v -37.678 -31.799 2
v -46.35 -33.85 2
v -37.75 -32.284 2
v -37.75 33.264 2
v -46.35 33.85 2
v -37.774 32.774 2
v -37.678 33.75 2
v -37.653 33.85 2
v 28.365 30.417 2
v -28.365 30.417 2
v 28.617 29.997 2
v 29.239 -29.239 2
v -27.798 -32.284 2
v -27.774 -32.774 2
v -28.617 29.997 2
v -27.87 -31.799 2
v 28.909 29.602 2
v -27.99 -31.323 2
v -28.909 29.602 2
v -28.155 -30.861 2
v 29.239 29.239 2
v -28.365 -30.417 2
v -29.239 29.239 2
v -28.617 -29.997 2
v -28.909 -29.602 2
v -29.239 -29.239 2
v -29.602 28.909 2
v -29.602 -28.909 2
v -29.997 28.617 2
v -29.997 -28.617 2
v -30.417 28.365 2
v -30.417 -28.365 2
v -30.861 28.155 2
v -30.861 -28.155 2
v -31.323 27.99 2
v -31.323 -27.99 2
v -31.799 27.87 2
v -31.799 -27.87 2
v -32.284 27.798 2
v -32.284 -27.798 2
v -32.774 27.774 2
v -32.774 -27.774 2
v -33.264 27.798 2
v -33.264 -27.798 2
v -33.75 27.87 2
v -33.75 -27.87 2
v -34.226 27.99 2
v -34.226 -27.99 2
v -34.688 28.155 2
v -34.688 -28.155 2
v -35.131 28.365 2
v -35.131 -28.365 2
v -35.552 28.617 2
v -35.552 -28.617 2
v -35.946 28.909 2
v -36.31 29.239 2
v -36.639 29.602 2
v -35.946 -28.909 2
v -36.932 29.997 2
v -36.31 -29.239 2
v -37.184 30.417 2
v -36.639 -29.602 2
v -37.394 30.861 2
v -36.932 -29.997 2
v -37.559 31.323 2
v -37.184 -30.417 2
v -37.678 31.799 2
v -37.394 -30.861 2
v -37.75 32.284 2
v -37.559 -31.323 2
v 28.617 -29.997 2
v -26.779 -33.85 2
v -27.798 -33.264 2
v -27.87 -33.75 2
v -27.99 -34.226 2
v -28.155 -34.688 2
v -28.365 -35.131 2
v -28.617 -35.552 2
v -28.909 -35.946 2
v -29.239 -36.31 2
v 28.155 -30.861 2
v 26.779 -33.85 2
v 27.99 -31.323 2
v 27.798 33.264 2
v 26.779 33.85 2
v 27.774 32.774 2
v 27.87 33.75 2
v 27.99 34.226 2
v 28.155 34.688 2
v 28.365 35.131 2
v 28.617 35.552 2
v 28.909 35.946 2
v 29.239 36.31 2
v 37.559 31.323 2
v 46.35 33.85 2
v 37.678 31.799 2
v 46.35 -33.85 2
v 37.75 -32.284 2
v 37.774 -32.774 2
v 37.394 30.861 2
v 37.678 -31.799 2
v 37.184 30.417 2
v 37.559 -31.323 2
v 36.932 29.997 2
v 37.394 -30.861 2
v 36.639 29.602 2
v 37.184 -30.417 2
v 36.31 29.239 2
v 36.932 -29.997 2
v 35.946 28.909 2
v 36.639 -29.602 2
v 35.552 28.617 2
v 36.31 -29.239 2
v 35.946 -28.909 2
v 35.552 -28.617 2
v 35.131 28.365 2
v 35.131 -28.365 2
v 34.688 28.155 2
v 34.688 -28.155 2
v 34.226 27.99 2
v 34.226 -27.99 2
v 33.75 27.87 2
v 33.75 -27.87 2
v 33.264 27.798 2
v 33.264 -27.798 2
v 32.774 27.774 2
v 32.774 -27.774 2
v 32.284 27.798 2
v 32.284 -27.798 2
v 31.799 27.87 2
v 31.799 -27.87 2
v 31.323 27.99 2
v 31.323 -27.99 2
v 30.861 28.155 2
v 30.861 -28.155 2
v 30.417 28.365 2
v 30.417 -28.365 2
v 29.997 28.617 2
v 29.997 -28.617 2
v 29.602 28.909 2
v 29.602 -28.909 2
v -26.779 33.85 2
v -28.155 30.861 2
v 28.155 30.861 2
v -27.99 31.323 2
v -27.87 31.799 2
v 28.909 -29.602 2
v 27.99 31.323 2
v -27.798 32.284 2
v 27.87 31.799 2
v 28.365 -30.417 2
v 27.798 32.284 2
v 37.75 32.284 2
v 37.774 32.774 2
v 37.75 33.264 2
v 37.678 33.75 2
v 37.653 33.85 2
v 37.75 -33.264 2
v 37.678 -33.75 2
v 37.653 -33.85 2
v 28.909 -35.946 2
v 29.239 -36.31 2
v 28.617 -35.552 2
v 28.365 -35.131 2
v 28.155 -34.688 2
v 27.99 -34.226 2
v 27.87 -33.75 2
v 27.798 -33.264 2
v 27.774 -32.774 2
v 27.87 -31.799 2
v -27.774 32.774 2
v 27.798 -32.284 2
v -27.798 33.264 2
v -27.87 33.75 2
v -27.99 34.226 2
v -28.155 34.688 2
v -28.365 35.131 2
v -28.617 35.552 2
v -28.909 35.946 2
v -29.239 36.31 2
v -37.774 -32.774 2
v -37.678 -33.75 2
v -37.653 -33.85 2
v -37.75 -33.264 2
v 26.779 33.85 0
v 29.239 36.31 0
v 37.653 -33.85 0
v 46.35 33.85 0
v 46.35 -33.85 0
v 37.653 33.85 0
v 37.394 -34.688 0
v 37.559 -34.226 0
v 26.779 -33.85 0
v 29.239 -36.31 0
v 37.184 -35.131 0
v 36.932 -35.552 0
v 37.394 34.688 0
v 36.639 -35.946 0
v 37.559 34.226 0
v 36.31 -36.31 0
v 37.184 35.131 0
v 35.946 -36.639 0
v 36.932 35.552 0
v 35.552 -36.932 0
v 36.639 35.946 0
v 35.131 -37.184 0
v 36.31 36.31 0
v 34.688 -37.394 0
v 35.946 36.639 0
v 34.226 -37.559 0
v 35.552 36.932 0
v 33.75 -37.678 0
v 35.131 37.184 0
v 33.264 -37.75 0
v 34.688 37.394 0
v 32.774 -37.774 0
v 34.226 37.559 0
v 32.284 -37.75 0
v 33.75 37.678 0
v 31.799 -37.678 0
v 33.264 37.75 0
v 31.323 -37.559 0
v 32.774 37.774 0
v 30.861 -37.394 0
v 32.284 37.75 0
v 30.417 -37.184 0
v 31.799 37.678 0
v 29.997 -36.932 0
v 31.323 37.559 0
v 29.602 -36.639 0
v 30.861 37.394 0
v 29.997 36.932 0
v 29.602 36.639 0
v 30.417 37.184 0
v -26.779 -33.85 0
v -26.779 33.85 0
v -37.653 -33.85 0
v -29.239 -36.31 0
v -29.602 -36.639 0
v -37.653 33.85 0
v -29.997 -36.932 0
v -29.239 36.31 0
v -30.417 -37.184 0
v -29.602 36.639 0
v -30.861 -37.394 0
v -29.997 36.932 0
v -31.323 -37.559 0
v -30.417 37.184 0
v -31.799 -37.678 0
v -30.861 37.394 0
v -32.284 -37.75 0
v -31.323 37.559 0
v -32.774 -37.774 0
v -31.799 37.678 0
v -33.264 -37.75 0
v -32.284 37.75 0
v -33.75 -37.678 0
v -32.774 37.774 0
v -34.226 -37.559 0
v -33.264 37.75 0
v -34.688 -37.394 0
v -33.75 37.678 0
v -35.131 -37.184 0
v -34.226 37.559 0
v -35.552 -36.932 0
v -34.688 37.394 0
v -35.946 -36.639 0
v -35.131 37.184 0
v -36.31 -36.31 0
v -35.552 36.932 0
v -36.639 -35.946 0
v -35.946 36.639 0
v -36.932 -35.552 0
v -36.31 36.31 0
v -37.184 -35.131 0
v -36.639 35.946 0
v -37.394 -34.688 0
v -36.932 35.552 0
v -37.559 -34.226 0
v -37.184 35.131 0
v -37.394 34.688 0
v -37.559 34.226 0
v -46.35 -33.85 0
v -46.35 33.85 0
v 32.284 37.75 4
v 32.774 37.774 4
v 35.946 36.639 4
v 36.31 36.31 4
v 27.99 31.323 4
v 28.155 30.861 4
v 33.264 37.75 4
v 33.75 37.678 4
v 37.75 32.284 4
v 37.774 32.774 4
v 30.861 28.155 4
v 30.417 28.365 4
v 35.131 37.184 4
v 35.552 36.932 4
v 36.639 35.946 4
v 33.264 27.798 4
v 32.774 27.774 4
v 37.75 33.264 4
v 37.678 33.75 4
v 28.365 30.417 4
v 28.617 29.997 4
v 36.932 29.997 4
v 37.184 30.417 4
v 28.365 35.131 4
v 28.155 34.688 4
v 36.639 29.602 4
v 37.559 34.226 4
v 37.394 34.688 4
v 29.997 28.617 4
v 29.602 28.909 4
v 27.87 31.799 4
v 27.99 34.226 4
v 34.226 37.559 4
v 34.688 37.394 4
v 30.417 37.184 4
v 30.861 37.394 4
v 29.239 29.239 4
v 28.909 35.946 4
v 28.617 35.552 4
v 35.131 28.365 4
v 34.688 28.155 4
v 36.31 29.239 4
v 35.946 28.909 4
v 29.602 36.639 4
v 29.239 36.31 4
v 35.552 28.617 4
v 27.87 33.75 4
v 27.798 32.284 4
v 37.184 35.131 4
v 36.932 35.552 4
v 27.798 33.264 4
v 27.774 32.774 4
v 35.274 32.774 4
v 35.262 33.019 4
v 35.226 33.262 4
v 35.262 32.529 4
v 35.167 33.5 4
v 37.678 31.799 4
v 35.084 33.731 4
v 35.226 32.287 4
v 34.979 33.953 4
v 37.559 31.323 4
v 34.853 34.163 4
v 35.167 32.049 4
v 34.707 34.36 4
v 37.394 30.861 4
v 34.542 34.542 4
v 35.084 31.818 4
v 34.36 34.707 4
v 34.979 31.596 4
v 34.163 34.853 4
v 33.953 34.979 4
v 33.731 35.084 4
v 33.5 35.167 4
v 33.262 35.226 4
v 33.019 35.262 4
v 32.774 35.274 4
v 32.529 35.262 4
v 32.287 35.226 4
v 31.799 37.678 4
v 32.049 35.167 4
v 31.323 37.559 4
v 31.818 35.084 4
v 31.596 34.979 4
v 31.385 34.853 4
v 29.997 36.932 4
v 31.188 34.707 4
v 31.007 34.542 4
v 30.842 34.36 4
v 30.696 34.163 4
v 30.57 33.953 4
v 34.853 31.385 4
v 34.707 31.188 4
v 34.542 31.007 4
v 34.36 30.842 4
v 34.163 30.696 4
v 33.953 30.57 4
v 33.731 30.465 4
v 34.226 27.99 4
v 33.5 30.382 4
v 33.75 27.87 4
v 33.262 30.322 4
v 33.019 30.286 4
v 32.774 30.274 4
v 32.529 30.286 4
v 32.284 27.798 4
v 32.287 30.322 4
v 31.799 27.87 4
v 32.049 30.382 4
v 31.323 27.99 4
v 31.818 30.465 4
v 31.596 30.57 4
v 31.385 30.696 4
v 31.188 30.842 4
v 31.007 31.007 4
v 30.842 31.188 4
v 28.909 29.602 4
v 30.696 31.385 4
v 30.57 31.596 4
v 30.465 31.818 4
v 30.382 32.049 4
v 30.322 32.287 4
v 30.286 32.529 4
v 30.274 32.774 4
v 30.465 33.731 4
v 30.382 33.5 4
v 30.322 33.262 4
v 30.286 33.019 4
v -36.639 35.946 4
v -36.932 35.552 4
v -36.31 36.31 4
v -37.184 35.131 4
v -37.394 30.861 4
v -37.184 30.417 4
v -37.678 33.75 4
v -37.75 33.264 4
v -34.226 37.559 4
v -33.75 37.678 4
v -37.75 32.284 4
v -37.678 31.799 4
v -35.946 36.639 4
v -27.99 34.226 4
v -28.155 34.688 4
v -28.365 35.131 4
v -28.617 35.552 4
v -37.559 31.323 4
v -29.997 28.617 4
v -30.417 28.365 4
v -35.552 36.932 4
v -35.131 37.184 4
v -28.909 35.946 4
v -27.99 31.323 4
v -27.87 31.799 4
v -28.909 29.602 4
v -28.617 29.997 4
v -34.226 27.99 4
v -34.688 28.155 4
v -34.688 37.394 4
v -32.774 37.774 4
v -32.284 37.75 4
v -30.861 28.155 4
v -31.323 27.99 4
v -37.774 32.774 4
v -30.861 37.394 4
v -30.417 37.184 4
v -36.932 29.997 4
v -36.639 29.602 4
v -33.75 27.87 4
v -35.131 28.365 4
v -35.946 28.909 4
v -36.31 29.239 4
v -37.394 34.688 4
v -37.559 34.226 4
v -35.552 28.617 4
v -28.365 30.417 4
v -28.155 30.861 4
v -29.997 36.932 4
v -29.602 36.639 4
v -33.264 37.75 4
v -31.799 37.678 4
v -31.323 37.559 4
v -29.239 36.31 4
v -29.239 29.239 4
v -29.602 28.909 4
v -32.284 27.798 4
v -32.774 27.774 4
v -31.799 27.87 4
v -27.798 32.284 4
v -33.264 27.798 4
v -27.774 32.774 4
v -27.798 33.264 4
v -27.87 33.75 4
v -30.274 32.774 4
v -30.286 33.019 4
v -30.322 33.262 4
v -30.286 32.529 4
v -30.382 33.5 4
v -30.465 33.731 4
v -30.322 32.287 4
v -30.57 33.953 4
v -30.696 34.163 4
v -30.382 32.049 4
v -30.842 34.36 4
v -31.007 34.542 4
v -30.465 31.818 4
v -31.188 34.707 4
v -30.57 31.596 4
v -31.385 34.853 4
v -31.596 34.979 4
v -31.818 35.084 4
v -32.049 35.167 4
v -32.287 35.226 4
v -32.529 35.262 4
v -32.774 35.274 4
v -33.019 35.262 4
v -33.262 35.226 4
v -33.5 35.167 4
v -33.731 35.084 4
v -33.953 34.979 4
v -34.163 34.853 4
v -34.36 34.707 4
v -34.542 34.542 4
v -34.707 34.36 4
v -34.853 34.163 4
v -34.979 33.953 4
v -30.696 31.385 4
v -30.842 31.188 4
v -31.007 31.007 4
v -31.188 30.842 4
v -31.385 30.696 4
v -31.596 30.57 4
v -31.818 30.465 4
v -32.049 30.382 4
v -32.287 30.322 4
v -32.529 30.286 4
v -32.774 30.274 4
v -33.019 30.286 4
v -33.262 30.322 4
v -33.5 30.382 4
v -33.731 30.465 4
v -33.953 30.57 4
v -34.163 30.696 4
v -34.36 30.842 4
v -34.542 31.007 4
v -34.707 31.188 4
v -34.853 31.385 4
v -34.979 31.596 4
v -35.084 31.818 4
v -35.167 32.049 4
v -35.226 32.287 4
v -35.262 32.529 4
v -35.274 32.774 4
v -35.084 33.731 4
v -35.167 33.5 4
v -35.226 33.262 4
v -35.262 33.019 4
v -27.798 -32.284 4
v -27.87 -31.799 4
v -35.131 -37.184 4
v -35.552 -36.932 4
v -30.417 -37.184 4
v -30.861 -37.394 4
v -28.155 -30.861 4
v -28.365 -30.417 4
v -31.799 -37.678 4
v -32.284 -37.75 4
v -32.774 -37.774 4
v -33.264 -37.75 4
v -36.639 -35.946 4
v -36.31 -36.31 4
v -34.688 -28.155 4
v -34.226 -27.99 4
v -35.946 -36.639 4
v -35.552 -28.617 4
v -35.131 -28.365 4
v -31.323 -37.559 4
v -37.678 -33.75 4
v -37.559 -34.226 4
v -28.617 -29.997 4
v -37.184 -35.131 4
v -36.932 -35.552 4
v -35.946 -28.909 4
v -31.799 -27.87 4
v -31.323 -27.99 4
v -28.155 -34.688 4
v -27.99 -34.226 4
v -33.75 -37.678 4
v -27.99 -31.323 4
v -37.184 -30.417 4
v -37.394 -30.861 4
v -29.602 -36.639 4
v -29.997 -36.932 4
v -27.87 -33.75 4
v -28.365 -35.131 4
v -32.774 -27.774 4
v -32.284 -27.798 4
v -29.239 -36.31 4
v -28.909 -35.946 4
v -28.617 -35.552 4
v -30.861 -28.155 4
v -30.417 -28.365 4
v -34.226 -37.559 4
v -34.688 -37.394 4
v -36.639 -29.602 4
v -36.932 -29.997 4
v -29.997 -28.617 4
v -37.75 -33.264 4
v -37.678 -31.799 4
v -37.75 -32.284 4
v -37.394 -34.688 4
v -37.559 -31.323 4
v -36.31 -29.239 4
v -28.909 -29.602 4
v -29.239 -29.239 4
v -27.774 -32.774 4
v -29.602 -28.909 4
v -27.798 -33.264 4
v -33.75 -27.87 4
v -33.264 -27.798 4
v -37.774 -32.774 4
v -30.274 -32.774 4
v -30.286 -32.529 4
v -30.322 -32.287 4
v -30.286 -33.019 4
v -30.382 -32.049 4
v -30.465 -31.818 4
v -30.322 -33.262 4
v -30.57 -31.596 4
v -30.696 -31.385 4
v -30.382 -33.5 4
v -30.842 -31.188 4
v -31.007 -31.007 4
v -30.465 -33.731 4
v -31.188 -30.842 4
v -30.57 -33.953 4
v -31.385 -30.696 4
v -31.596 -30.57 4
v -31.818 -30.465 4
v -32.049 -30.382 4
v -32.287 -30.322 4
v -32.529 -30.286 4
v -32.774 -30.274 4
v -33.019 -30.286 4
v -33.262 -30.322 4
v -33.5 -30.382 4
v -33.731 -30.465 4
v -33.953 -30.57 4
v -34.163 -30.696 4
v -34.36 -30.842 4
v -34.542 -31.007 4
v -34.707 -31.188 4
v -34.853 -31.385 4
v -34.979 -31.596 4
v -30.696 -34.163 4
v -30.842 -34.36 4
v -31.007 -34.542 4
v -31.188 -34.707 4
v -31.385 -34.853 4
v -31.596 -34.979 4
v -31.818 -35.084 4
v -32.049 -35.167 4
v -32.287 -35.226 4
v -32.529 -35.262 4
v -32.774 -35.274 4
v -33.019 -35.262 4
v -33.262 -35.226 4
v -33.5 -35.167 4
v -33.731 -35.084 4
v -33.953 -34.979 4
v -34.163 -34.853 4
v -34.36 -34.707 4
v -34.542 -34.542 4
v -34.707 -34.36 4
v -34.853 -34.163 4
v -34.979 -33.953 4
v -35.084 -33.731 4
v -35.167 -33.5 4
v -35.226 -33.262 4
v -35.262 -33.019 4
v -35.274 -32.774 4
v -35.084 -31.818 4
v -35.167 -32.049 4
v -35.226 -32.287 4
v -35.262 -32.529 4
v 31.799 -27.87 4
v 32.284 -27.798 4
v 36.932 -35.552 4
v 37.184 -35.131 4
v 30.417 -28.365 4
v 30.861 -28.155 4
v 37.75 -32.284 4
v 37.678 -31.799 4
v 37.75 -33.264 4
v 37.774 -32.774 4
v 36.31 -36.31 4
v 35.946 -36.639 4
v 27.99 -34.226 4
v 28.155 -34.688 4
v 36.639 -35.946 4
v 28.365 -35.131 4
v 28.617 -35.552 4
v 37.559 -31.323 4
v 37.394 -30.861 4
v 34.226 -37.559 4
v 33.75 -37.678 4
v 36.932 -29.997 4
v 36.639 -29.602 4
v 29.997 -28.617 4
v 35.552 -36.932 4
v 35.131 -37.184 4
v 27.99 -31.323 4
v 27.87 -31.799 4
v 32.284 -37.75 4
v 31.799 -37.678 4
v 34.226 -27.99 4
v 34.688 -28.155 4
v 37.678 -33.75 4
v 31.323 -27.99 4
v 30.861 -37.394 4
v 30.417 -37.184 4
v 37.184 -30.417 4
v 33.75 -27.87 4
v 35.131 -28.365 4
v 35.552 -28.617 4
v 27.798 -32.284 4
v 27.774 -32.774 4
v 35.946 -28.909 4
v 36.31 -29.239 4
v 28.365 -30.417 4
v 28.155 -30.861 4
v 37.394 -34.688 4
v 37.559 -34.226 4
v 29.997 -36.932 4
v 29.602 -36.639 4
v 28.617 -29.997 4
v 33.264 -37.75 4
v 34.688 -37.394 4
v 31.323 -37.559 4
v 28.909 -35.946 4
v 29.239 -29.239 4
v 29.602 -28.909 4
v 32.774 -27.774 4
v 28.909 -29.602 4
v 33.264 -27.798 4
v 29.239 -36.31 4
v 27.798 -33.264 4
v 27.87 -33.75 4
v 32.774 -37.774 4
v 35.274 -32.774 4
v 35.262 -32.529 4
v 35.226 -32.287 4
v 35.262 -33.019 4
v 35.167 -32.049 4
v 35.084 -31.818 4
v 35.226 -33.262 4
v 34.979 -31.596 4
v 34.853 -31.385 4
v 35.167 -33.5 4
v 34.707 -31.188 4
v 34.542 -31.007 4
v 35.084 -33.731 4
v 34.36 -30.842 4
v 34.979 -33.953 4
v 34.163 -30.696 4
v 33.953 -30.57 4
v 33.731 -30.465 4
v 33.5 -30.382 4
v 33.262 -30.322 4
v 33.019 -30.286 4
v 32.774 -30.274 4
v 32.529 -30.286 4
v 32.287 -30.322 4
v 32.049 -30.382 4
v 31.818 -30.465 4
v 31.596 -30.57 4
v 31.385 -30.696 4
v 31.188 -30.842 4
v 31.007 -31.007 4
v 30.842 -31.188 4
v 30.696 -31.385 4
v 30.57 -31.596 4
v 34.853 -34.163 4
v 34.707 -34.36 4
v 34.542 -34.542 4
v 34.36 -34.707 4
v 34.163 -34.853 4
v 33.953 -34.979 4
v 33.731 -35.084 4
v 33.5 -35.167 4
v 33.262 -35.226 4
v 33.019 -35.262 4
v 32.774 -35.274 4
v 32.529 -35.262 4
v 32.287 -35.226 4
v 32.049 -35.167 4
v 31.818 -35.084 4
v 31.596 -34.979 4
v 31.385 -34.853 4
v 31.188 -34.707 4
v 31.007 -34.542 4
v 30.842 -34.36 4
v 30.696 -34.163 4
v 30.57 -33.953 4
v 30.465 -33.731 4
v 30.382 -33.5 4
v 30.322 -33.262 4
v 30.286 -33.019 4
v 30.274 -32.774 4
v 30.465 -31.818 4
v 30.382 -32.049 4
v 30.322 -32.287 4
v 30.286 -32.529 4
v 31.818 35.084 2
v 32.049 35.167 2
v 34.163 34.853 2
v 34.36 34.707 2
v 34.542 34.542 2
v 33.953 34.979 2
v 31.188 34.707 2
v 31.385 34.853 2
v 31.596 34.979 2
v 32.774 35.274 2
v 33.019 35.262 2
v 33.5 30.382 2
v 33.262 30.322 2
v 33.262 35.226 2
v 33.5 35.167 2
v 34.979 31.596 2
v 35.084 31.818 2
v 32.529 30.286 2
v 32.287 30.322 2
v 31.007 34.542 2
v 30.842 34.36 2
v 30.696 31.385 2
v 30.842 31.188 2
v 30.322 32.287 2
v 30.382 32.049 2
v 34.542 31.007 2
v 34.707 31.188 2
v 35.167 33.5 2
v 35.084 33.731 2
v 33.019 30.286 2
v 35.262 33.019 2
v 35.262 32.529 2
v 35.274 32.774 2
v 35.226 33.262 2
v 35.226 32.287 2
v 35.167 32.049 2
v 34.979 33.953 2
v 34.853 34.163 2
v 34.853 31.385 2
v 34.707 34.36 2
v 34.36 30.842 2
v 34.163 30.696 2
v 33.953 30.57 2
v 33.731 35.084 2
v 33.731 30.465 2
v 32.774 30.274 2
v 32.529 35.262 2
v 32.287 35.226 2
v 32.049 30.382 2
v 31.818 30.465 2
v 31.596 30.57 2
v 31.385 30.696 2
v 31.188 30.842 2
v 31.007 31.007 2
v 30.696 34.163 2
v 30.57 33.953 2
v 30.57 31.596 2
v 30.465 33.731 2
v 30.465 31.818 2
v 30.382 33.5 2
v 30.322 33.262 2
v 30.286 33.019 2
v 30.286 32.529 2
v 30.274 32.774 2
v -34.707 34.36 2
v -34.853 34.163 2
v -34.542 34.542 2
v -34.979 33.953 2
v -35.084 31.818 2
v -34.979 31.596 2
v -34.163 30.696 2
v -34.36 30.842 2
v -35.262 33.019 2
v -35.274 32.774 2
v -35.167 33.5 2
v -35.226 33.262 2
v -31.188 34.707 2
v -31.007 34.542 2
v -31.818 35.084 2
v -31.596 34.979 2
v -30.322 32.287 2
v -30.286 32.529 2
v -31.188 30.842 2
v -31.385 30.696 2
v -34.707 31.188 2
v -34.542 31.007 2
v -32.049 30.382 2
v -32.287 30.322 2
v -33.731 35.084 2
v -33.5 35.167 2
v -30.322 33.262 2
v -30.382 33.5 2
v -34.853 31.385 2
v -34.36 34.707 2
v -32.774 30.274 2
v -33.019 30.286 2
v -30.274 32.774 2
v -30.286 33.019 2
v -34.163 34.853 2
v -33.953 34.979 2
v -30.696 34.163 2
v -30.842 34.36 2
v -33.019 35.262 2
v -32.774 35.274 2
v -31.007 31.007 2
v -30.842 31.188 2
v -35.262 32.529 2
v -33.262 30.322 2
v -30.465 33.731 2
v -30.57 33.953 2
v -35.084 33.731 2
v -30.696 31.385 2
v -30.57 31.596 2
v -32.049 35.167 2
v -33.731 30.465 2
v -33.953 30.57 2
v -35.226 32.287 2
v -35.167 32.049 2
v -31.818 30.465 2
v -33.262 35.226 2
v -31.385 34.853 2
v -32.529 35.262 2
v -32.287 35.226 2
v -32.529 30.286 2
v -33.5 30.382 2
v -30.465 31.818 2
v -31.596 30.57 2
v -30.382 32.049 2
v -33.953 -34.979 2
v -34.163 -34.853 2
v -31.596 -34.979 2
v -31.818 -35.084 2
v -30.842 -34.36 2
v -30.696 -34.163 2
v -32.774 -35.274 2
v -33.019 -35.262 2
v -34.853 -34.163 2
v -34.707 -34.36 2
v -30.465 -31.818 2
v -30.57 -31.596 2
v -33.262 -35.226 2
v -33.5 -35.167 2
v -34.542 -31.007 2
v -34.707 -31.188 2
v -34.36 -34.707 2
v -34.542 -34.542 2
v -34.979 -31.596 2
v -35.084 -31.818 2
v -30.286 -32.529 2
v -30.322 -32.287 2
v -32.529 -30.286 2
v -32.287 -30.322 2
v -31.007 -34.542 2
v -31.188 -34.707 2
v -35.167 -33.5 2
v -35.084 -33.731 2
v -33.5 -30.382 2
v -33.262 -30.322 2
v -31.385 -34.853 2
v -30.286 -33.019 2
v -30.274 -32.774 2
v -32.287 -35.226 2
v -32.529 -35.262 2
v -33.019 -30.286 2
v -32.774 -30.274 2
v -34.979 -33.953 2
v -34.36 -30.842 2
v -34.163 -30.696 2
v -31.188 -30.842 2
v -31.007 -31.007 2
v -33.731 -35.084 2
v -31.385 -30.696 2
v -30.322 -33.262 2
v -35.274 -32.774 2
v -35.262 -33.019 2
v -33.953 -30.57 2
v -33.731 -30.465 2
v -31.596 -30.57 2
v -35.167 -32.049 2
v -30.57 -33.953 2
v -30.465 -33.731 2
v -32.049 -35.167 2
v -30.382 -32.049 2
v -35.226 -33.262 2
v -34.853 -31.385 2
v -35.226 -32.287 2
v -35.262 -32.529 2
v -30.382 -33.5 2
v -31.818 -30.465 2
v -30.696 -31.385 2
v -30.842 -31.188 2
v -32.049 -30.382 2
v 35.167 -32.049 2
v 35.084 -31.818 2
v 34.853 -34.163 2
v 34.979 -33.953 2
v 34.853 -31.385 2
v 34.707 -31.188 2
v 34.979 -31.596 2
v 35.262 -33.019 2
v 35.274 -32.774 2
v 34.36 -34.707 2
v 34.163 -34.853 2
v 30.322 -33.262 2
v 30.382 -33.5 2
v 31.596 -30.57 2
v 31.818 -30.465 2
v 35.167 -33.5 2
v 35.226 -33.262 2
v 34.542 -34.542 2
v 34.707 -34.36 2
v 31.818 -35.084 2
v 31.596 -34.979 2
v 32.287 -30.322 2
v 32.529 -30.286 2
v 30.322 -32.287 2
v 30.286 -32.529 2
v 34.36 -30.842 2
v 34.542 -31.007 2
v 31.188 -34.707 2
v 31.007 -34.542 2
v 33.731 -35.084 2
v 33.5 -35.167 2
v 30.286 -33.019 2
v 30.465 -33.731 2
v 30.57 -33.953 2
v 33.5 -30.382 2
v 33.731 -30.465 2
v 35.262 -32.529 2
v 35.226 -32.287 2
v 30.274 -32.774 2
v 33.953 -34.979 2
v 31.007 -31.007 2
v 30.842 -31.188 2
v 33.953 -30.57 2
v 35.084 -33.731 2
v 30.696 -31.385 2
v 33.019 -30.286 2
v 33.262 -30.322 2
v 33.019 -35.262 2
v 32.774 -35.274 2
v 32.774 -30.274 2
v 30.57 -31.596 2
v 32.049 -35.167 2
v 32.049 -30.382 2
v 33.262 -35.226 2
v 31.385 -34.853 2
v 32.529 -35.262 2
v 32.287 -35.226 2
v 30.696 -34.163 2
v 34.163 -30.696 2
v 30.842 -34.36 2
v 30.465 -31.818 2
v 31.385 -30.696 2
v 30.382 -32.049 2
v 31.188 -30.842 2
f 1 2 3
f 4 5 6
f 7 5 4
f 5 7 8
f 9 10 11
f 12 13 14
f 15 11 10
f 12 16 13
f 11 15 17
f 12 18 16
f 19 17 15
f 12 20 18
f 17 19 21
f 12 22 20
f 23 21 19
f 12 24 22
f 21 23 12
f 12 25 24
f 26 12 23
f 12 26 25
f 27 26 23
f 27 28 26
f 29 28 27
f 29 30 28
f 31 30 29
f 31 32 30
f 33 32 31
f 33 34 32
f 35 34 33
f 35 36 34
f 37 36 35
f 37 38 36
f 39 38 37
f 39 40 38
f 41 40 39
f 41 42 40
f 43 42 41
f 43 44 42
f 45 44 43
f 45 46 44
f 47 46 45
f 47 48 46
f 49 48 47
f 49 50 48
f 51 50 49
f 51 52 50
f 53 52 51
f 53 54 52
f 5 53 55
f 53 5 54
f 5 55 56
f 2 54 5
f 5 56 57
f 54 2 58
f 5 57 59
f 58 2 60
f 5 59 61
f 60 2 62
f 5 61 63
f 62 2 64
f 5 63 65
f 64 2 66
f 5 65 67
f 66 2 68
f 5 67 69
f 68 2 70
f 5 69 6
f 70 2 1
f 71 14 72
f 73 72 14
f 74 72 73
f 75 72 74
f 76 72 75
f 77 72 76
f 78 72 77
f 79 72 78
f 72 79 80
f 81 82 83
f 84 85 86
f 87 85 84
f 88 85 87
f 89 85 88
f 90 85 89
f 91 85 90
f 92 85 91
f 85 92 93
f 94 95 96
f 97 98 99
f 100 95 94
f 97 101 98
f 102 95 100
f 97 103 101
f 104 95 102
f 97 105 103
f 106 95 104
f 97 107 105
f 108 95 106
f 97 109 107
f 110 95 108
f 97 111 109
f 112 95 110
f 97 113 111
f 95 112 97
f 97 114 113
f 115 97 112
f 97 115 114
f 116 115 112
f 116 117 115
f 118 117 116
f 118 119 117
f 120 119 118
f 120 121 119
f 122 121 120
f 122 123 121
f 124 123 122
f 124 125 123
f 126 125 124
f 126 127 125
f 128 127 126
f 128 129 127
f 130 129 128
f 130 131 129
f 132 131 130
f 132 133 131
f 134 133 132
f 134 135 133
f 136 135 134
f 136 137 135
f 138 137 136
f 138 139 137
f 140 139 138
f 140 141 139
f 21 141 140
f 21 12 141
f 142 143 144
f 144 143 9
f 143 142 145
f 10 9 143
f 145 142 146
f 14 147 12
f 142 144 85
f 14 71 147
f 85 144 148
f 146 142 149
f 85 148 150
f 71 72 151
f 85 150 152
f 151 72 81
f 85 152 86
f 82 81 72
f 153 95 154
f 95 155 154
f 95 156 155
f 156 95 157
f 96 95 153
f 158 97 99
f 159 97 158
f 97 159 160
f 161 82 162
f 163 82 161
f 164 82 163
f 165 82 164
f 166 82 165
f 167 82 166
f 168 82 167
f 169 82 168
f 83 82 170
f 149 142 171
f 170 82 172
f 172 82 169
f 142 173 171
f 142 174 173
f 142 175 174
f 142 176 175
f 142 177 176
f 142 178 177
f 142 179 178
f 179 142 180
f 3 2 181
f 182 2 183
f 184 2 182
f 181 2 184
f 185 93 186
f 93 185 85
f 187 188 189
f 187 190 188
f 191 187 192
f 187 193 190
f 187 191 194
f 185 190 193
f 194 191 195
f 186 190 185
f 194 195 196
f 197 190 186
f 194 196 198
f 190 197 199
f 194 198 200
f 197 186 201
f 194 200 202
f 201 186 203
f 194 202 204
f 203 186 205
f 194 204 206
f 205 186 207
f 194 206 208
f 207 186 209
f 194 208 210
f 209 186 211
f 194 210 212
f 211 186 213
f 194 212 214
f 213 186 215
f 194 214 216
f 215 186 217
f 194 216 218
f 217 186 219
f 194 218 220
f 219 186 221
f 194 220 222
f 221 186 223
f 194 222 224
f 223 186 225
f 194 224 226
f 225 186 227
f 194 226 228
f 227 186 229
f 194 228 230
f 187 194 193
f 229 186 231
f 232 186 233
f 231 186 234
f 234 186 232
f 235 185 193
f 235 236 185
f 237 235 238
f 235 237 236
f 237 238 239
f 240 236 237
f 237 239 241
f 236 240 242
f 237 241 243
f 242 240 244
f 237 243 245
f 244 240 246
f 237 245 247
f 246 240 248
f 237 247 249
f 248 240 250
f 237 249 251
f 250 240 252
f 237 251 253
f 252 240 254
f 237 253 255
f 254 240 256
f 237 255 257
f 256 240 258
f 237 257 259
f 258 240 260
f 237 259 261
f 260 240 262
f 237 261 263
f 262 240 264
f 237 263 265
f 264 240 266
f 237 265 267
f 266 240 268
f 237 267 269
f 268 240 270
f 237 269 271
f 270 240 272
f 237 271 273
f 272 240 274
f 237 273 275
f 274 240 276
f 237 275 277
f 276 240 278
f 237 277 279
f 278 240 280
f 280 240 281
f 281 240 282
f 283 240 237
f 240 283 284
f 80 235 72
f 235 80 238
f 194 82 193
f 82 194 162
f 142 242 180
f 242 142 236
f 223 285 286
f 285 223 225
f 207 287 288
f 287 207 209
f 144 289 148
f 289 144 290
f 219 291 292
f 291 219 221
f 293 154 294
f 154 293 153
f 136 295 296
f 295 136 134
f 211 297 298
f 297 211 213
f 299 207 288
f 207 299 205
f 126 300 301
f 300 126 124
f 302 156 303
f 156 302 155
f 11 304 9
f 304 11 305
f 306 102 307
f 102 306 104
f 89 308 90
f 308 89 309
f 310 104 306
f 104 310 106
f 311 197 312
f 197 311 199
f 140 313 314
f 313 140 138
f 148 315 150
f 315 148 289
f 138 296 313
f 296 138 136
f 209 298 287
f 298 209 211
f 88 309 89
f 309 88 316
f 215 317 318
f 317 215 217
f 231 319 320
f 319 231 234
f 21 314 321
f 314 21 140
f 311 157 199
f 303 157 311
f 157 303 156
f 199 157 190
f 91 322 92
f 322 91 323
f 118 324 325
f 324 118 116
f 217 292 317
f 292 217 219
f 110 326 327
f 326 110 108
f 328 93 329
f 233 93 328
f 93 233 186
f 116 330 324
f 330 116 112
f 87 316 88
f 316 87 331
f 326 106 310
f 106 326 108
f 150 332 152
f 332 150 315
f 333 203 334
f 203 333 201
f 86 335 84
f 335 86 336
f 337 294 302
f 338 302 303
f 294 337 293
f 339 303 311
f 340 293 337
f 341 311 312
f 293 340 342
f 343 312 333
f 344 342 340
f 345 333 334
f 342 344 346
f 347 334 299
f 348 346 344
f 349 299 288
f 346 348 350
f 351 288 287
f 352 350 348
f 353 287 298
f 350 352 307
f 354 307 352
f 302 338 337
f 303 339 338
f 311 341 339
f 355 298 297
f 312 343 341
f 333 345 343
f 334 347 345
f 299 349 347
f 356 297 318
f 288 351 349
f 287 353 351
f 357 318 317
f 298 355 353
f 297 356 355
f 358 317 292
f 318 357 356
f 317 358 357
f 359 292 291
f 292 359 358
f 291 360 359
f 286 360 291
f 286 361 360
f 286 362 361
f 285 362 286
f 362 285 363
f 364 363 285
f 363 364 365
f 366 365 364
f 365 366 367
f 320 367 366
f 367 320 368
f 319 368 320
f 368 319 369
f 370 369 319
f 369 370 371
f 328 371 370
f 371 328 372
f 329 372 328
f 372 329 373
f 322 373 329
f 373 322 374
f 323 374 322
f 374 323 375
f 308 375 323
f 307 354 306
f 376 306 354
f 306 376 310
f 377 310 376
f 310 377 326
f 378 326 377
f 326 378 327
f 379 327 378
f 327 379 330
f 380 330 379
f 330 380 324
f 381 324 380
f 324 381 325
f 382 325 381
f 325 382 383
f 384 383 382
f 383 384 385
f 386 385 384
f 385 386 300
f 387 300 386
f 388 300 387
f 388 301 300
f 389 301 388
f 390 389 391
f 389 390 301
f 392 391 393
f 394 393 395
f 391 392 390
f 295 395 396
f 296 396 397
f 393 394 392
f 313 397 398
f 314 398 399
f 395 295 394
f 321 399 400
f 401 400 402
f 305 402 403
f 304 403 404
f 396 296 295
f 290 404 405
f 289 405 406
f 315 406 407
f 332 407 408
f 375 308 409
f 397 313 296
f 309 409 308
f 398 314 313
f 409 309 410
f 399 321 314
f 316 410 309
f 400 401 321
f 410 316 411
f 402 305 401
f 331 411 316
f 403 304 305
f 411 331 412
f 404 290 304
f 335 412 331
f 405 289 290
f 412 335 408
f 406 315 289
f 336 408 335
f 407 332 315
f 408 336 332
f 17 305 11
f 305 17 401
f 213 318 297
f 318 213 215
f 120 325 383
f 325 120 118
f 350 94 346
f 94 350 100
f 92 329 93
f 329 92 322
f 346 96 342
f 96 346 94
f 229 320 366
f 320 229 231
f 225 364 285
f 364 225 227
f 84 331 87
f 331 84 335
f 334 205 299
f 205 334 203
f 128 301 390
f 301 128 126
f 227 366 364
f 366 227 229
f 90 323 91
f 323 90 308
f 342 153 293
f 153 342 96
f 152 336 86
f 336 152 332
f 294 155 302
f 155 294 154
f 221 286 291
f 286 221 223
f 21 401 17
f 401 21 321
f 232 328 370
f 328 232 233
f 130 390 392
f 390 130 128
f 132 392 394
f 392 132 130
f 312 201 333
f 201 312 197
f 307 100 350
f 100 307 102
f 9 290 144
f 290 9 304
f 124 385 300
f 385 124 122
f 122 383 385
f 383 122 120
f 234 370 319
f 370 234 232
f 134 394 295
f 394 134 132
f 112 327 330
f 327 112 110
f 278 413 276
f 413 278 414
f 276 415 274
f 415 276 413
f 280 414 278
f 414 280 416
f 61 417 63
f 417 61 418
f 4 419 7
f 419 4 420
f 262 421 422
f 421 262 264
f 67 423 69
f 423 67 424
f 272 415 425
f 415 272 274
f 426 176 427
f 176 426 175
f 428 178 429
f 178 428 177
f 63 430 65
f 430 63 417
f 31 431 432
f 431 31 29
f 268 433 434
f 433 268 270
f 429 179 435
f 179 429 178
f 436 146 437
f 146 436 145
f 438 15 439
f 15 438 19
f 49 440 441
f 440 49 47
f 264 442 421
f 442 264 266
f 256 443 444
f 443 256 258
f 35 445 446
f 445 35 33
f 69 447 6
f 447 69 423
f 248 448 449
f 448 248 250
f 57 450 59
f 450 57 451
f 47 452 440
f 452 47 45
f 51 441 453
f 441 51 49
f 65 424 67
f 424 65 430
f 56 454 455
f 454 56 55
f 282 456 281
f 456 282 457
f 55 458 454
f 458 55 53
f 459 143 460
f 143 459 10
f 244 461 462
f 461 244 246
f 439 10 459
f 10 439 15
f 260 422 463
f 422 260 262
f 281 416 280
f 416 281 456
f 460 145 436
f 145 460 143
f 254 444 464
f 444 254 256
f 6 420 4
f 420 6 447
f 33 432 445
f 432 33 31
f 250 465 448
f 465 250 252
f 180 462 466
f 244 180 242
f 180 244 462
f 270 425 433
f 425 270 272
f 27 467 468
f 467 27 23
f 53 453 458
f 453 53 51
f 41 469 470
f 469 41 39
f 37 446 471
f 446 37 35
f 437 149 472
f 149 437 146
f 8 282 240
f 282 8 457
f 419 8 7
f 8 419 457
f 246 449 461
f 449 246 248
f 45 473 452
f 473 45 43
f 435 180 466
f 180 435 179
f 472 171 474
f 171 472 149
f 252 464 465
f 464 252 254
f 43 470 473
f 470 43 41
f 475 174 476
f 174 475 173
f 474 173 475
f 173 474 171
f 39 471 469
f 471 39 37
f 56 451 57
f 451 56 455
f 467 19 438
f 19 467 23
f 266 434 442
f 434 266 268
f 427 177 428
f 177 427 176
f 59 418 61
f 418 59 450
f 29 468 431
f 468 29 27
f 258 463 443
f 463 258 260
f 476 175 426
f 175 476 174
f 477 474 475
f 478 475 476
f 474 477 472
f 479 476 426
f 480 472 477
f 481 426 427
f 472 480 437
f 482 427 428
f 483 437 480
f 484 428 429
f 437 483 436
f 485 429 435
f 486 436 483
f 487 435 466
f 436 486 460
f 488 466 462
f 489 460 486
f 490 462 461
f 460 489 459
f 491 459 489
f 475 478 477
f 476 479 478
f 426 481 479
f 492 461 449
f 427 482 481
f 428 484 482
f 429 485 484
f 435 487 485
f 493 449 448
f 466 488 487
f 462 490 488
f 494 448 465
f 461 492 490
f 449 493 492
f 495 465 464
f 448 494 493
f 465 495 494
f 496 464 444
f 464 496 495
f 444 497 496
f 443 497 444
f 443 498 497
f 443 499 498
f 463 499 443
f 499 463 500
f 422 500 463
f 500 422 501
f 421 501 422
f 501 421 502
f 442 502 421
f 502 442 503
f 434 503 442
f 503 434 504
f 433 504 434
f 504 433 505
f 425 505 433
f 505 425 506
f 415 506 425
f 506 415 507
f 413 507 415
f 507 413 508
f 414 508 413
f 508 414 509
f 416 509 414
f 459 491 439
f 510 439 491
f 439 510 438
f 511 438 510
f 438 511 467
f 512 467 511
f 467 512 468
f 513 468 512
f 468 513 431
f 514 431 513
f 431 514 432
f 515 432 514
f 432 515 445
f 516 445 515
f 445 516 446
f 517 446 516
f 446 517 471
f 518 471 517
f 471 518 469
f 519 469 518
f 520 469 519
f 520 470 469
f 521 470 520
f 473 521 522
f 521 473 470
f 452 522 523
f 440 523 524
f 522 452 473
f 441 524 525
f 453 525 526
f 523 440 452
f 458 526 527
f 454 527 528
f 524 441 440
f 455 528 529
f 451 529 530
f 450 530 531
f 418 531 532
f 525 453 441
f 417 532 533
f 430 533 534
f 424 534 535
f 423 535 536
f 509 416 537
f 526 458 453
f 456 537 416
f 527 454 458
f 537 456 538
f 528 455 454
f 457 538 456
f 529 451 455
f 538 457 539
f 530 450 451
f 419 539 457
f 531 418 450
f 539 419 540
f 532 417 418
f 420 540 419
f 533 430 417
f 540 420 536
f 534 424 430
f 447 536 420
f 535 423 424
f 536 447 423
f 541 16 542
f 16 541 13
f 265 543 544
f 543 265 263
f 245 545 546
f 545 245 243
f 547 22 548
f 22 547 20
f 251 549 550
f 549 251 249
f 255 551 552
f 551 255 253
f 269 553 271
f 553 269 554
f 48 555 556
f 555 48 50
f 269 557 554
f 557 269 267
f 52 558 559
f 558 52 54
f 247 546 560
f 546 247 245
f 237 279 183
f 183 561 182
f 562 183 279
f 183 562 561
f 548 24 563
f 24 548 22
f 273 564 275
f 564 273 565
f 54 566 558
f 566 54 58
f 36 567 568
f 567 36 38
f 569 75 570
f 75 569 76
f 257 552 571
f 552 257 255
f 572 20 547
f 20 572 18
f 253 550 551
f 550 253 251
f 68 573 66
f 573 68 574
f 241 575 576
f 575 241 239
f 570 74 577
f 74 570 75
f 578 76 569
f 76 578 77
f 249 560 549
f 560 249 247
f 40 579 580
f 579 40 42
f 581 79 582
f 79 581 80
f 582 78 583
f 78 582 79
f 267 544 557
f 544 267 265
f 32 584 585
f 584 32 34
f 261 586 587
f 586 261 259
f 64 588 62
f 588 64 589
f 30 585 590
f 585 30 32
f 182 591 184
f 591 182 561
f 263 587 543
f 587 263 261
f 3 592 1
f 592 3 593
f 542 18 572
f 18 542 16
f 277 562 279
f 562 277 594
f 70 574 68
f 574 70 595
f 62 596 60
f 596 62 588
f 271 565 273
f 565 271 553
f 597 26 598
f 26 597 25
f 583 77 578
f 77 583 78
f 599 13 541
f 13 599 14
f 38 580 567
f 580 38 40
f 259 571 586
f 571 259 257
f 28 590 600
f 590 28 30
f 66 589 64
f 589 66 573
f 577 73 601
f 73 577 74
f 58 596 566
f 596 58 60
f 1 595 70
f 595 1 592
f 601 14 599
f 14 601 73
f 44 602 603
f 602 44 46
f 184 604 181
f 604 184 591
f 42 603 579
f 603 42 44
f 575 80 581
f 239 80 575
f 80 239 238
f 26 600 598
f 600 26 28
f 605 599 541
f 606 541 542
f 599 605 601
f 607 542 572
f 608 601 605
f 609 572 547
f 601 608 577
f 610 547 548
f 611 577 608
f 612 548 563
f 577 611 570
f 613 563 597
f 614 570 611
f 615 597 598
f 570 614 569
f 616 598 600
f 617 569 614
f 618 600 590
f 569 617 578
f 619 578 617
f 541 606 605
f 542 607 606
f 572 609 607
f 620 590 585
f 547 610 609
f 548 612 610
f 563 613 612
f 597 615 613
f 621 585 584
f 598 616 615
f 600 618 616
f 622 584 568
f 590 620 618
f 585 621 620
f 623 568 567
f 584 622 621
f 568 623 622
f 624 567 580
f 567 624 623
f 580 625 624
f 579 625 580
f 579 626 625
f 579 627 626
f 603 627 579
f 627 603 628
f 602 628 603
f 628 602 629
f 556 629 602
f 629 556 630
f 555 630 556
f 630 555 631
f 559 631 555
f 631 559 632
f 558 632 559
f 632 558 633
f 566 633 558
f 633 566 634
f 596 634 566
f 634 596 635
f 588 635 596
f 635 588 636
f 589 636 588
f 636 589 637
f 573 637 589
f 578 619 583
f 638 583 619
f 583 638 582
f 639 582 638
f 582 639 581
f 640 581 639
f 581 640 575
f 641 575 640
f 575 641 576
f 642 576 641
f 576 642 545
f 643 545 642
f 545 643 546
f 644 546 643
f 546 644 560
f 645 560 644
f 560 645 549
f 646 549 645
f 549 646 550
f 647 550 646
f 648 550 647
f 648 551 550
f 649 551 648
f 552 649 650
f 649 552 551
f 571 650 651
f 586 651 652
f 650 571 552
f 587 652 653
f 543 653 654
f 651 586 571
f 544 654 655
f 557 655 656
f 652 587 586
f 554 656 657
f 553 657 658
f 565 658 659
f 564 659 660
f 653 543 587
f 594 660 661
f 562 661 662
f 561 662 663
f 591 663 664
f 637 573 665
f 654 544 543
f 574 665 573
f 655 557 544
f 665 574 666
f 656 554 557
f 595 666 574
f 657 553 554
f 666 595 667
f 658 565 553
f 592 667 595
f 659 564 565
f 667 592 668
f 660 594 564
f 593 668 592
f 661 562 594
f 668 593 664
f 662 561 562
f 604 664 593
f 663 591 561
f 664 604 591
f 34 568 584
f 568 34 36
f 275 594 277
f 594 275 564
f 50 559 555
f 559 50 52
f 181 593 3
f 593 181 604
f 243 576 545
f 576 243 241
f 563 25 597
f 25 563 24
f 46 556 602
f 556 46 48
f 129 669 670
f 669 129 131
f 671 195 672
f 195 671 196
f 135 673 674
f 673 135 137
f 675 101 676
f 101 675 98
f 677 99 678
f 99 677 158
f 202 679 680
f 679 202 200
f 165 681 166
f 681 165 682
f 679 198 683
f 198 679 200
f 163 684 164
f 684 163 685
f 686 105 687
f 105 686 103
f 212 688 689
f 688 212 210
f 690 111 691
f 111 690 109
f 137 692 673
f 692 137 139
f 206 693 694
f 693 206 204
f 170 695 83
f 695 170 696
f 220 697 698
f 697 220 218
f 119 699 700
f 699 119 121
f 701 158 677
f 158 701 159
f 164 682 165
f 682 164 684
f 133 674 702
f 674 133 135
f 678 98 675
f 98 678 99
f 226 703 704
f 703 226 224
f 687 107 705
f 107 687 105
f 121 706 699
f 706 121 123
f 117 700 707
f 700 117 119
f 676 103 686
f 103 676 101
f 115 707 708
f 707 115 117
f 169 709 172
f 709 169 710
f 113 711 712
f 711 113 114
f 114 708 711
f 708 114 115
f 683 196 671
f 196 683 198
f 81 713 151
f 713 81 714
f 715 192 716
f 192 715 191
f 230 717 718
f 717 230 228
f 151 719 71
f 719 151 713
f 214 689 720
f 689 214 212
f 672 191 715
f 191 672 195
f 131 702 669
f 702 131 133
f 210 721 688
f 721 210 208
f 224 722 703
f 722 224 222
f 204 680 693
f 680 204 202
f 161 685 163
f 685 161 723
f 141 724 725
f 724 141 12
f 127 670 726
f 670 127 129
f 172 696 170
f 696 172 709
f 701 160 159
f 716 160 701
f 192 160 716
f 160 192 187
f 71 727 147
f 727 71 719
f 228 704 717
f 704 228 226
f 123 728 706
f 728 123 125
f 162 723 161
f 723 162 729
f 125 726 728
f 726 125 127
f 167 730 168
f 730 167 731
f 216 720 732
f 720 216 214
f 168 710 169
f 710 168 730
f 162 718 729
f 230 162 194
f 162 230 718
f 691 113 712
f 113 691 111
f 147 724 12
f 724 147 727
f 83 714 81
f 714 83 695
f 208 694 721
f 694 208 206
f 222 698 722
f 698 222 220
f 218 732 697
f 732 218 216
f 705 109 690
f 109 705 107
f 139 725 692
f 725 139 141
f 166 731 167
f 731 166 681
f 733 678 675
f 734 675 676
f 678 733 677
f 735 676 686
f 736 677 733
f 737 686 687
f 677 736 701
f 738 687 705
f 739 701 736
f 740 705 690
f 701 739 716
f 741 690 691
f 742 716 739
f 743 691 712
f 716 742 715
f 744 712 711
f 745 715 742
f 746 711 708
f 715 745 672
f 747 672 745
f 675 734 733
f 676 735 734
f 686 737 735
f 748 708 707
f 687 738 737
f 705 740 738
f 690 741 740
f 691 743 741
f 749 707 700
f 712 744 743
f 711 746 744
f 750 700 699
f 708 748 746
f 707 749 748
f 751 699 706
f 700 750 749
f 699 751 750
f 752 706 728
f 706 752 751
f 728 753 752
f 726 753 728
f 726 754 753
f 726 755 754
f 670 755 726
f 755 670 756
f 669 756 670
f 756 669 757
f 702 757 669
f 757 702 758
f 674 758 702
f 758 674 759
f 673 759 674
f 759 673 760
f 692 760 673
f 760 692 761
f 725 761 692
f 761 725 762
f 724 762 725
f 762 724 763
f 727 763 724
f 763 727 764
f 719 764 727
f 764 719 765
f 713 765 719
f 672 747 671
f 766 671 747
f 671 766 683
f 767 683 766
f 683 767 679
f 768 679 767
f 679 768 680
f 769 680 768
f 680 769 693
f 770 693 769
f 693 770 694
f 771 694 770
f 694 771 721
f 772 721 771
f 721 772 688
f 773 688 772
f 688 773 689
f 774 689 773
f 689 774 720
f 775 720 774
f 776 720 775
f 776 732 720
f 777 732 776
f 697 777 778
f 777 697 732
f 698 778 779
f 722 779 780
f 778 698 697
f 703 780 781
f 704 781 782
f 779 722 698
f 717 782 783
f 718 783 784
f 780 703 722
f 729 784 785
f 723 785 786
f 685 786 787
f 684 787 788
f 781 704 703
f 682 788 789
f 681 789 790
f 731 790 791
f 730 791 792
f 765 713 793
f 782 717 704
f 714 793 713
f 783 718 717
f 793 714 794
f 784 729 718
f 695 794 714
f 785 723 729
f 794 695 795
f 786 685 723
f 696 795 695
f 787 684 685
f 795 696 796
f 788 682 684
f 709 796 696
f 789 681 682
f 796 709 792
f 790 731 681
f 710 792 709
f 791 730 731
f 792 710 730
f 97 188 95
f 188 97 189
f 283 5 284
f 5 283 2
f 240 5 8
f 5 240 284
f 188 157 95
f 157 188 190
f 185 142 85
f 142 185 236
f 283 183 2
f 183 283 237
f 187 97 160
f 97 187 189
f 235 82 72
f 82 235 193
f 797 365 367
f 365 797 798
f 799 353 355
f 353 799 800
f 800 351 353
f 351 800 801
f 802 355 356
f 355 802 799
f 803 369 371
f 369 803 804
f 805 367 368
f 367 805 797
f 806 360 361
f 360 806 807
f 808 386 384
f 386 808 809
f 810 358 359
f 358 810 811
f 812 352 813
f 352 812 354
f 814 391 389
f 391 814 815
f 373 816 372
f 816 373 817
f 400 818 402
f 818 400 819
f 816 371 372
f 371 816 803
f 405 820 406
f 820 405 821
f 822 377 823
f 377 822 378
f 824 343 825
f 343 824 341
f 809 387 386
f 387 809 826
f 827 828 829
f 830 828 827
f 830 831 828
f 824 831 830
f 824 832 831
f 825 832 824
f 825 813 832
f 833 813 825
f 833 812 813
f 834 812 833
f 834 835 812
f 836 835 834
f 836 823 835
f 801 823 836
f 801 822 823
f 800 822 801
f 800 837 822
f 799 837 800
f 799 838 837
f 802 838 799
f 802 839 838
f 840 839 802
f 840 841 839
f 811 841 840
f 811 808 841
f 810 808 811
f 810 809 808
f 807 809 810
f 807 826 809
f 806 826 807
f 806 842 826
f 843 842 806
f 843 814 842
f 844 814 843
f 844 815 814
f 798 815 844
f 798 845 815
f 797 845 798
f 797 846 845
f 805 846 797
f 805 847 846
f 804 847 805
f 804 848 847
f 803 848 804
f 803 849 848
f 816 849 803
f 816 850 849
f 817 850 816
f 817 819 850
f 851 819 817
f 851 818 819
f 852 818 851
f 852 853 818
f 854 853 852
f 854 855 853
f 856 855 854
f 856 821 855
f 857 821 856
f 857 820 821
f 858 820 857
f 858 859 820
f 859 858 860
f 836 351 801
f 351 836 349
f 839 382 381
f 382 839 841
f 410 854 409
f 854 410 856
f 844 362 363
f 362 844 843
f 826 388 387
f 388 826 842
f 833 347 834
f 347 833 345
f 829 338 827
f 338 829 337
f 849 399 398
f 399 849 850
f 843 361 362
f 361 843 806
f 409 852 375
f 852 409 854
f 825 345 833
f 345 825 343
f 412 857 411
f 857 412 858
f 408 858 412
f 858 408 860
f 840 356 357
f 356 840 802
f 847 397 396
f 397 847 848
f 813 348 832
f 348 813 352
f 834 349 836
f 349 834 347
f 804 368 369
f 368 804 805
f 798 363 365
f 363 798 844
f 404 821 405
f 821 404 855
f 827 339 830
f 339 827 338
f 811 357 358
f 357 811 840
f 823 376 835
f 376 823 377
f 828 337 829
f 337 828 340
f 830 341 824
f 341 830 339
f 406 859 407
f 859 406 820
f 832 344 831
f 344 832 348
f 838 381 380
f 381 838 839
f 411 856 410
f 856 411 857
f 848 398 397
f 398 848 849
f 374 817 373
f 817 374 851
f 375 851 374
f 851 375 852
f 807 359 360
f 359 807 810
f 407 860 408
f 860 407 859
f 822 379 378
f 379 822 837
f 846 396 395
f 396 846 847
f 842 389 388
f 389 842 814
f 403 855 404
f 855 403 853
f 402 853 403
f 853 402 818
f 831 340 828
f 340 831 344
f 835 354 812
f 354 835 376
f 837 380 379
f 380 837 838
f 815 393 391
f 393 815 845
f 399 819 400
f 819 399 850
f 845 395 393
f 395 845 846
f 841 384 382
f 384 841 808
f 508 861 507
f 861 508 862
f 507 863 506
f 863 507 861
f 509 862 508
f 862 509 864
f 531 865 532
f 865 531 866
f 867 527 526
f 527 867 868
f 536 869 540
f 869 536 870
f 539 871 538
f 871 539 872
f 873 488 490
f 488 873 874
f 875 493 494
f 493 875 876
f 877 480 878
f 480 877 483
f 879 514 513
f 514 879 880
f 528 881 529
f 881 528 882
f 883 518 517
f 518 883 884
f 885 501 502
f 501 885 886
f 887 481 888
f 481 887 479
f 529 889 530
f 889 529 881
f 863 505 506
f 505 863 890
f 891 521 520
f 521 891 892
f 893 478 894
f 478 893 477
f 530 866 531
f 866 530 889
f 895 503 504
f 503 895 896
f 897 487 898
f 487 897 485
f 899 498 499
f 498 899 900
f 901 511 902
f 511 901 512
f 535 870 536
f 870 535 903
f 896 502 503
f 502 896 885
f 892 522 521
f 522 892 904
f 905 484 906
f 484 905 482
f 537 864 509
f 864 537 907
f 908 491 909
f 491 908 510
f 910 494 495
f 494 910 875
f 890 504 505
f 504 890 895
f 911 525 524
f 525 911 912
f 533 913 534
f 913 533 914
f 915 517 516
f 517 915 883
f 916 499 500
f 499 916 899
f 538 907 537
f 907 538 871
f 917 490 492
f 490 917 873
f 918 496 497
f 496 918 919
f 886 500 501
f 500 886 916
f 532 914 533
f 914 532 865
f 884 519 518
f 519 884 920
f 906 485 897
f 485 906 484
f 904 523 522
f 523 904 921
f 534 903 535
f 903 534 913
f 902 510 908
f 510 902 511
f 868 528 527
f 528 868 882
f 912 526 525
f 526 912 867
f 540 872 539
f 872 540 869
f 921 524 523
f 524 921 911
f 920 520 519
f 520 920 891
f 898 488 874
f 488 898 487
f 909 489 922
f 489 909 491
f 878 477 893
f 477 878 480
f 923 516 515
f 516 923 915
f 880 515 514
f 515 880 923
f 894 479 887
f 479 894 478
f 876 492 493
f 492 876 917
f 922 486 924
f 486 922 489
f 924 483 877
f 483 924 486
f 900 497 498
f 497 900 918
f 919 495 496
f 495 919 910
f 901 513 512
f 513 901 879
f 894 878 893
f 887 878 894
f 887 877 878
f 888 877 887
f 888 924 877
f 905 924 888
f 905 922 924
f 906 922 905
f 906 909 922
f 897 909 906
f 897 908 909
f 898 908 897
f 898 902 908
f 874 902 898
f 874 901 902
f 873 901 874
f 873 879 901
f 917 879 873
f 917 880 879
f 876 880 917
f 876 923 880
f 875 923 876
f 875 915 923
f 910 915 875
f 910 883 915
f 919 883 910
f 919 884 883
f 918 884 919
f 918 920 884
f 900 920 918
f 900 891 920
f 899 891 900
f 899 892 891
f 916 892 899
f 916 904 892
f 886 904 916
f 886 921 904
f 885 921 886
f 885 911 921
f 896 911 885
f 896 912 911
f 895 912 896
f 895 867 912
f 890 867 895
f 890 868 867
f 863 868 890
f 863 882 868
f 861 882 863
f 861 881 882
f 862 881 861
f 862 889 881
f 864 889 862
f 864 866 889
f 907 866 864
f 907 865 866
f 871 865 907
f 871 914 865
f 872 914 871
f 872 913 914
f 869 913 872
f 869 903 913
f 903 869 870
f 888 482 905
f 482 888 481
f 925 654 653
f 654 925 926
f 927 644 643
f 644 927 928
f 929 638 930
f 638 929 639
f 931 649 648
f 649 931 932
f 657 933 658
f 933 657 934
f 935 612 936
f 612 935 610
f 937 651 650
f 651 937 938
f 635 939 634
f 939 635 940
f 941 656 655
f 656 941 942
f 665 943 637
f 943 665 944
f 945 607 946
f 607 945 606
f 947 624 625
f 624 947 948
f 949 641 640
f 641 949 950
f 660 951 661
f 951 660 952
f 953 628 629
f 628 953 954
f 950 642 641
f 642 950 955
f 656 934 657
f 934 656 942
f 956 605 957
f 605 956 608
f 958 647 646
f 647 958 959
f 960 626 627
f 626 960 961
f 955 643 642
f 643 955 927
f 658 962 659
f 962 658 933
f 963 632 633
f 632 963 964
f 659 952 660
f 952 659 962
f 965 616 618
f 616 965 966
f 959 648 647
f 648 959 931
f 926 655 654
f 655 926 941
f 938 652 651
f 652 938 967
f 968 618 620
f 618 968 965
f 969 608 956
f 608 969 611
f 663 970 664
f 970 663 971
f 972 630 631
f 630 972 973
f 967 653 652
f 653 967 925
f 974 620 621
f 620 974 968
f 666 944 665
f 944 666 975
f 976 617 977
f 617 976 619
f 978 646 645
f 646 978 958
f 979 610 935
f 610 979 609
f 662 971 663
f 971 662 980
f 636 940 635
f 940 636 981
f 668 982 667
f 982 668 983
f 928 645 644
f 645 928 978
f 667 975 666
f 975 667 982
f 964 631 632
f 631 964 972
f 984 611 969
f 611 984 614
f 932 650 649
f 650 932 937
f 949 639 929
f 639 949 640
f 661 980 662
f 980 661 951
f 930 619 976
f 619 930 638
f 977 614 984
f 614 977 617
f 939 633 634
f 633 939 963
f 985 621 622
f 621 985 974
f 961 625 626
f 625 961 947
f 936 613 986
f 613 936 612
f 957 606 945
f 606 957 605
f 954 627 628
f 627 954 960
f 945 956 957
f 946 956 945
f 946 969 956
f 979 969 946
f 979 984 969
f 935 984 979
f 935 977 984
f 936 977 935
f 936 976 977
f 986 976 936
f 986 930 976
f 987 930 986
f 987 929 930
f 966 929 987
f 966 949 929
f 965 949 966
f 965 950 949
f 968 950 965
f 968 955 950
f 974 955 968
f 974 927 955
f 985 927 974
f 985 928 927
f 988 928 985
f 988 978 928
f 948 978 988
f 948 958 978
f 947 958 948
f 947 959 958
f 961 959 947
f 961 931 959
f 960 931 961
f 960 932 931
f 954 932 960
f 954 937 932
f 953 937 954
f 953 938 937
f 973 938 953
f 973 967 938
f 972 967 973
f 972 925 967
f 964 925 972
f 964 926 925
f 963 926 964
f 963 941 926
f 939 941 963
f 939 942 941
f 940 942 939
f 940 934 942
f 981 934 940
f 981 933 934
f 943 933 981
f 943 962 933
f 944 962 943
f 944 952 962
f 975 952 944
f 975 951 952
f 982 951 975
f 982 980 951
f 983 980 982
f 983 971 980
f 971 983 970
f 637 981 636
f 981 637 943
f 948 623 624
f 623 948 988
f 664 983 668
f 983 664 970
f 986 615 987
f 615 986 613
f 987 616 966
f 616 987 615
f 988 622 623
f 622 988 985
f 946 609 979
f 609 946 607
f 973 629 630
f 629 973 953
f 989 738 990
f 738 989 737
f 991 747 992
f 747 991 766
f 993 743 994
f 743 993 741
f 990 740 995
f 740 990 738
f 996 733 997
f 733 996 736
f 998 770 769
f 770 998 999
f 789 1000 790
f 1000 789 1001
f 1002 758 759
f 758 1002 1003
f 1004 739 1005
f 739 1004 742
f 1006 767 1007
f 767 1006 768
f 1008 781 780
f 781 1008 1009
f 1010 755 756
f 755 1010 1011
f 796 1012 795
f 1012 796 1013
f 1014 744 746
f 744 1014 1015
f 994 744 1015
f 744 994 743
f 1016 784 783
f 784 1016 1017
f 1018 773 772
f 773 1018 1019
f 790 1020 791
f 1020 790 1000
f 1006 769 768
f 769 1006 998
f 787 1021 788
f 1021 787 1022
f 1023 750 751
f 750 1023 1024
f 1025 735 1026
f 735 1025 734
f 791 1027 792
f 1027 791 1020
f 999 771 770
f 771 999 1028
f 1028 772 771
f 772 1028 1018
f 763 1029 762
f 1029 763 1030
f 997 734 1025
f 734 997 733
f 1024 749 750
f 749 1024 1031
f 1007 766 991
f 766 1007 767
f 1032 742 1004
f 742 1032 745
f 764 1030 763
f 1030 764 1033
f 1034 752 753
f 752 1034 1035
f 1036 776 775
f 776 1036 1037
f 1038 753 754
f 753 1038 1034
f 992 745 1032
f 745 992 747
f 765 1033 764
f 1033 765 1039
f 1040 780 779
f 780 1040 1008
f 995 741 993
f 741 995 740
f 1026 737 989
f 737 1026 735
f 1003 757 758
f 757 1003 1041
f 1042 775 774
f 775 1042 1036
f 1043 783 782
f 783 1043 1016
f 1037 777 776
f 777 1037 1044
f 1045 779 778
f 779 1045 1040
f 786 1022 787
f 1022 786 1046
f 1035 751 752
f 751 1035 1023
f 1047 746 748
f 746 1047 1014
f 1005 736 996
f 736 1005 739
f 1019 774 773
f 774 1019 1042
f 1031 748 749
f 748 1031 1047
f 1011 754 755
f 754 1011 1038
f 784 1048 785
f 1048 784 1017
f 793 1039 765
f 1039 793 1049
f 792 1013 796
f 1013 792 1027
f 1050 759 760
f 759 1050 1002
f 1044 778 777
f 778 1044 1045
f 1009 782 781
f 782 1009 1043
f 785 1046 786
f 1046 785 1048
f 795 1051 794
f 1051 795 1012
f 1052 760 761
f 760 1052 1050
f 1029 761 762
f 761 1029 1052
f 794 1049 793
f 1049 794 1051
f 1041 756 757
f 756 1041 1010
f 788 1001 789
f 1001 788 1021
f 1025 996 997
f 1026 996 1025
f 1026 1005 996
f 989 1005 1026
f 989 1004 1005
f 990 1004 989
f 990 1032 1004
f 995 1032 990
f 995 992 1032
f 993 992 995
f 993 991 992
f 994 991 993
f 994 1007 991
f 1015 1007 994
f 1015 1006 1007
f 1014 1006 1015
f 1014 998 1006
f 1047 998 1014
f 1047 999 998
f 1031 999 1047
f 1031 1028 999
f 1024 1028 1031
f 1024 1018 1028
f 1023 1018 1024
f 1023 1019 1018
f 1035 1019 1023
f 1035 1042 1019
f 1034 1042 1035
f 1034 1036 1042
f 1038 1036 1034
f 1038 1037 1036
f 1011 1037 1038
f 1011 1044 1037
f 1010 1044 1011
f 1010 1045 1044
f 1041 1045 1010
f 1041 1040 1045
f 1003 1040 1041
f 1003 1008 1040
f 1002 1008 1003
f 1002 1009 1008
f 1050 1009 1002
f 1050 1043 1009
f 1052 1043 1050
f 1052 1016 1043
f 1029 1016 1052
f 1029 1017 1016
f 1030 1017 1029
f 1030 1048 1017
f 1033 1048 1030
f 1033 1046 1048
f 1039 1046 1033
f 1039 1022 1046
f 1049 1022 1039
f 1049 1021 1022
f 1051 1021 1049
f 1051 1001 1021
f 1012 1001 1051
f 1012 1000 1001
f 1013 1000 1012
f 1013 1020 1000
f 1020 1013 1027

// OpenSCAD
module x_shaped_bracket() {
    difference() {
        union() {
            // Central rectangular plate
            translate([-46.35, -33.85, 0])
                cube([92.7, 67.7, 2]);

            // Diagonal arms
            for (angle = [45, 135, 225, 315]) {
                rotate([0, 0, angle])
                    translate([0, 0, 1])
                        cube([92.7, 10, 2], center = true);
            }

            // Circular lugs/bosses
            for (angle = [45, 135, 225, 315]) {
                rotate([0, 0, angle])
                    translate([46.35, 0, 0])
                        cylinder(h = 4, d = 10, $fn = 64);
            }
        }

        // Through-holes in the lugs
        for (angle = [45, 135, 225, 315]) {
            rotate([0, 0, angle])
                translate([46.35, 0, 2])
                    cylinder(h = 10, d = 5, $fn = 64);
        }
    }
}

x_shaped_bracket();
